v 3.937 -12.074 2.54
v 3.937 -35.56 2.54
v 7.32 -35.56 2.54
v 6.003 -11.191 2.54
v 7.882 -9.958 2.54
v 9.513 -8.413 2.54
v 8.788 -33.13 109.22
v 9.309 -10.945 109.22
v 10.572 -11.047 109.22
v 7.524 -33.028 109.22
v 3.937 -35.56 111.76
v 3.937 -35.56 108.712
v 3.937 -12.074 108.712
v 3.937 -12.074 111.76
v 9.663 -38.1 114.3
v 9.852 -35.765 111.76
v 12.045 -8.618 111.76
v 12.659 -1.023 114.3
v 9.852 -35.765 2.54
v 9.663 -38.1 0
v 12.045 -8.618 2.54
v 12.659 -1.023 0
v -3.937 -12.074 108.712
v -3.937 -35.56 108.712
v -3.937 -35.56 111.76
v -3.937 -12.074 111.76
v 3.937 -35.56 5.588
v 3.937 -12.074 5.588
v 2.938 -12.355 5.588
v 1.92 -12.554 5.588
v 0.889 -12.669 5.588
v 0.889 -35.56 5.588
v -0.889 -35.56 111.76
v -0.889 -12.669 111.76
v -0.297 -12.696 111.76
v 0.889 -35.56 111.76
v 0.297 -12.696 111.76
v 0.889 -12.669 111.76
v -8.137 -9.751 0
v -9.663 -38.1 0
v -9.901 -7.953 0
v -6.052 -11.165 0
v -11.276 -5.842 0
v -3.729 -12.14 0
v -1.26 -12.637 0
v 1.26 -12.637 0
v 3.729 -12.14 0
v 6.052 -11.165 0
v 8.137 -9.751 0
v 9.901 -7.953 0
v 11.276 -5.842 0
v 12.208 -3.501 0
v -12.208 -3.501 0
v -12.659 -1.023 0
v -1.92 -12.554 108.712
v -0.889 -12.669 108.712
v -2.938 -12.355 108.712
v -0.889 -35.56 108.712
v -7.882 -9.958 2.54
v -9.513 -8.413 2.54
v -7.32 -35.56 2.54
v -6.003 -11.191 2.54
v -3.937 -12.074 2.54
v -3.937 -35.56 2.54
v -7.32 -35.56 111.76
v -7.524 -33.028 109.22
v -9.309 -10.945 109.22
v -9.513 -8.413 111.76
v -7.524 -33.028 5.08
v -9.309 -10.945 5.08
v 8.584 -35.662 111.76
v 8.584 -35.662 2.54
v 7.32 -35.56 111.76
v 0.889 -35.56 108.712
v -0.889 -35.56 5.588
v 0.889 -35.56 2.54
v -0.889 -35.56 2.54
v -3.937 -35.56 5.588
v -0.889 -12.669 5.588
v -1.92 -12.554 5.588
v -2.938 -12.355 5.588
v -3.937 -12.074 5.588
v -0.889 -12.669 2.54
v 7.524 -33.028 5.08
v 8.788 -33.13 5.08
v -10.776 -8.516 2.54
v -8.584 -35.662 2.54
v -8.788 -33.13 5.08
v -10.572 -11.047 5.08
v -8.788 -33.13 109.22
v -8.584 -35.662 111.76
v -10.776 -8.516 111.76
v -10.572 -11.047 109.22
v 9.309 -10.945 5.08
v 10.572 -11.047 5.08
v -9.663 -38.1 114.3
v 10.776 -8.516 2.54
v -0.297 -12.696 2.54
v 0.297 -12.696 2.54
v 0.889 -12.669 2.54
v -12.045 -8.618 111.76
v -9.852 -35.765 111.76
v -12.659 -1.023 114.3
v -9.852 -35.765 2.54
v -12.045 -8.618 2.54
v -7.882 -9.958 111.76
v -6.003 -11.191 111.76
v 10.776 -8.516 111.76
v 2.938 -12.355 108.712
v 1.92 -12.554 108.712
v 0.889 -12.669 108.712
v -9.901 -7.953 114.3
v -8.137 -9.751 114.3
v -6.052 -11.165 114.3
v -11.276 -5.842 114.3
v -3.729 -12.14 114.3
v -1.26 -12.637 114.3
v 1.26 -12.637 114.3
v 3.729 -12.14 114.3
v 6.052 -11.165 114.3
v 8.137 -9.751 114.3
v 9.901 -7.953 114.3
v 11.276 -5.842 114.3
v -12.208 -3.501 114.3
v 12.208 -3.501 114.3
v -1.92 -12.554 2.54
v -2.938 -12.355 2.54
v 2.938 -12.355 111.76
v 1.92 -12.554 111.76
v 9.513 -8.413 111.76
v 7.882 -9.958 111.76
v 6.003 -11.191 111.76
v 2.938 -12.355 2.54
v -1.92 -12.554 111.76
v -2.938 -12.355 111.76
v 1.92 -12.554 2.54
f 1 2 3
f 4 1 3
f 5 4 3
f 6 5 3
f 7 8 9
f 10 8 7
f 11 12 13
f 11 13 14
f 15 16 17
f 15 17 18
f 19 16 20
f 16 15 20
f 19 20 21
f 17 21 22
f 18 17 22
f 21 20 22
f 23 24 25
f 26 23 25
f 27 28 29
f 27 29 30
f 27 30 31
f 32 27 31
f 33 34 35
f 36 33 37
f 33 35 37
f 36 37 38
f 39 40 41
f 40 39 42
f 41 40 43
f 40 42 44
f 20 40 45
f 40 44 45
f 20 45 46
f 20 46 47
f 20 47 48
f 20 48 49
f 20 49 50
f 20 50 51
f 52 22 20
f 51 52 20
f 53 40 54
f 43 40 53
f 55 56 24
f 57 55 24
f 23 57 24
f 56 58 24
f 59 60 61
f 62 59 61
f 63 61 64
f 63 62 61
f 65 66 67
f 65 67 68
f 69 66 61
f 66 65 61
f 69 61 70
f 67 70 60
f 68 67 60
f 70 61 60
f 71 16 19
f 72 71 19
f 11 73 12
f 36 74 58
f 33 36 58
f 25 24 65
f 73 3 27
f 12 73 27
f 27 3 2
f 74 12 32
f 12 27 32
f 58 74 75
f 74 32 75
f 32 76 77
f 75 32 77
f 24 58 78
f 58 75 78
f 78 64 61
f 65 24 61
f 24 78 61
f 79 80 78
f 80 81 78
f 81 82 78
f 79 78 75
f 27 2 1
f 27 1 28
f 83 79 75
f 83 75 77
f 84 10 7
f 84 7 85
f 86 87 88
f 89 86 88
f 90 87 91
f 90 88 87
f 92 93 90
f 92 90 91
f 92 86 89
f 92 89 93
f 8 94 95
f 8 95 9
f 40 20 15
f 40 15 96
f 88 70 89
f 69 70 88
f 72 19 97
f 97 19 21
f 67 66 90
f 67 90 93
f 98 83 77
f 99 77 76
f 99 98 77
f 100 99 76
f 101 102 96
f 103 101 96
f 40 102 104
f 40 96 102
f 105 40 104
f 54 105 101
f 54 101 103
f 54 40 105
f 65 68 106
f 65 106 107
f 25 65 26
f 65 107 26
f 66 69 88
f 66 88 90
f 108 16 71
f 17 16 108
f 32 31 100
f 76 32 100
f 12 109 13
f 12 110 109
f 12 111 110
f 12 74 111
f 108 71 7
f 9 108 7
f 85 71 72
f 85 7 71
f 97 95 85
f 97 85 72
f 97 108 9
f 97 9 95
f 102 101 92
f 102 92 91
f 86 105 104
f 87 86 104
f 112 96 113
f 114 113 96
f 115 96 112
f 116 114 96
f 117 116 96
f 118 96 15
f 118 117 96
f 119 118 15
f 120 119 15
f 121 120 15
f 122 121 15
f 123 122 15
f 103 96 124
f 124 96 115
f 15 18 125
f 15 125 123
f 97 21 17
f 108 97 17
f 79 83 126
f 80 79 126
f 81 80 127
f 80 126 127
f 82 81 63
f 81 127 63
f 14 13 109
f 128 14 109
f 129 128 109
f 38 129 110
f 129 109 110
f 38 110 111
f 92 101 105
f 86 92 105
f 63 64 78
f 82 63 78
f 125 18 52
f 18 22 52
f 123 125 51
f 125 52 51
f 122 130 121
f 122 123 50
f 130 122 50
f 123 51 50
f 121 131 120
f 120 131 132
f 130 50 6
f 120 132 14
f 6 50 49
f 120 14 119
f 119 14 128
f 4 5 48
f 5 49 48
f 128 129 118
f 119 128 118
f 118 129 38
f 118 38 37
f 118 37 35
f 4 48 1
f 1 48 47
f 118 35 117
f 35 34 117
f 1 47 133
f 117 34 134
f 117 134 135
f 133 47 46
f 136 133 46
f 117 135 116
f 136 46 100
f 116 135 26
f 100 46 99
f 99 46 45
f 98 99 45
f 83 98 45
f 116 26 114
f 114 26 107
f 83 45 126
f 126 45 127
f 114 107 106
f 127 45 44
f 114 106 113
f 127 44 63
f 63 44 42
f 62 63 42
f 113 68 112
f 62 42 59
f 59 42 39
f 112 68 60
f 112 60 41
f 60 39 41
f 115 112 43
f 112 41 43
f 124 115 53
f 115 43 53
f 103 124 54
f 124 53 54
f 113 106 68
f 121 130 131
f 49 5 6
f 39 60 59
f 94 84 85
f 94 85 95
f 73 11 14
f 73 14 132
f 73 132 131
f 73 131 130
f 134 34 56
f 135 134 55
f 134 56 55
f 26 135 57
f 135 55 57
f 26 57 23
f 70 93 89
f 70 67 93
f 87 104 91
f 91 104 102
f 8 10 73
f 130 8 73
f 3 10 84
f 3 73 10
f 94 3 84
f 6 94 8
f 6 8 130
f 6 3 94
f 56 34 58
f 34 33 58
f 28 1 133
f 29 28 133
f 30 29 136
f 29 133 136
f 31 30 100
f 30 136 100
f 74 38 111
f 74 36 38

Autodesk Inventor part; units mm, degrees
ref_plane "YZ Plane" through (0, 0, 0) normal (1, 0, 0) x (0, 1, 0)
ref_plane "XZ Plane" through (0, 0, 0) normal (0, 1, 0) x (-1, 0, 0)
sketch "Sketch1" plane through (0, 0, 0) normal (0, 0, 1) x (1, 0, 0)
  arc A0 (-12.6587, -1.0228) -> (12.6587, -1.0228) centre (0, 0) ccw
  line L0 (0, 0) -> (0, -38.1)
  line L1 (0, -38.1) -> (-9.663, -38.1)
  line L2 (-9.663, -38.1) -> (-12.6587, -1.0228)
  line L3 (0, -38.1) -> (9.663, -38.1)
  line L4 (9.663, -38.1) -> (12.6587, -1.0228)
  dimension "d0" = 25.4
  dimension "d1" = 38.1
  dimension "d2" = 9.663
  dimension "d3" = 9.663
extrude "Extrusion1" add sketch "Sketch1" along normal blind 114.3
shell "Shell1" thickness 2.54 removed faces 1 at (-12.5308, -2.0661, 76.2)
sketch "Sketch2" plane through (-9.5133, -8.4135, 111.76) normal (0.9968, 0.0805, 0) x (0, 0, -1)
  line L0 (109.22, 0) -> (109.22, -27.235) projected
  line L1 (0, 0) -> (109.22, 0) projected
  line L2 (0, 0) -> (0, -27.235) projected
  line L3 (109.22, -27.235) -> (0, -27.235) projected
  line L4 (106.68, -2.54) -> (106.68, -24.695)
  line L5 (106.68, -24.695) -> (2.54, -24.695)
  line L6 (2.54, -24.695) -> (2.54, -2.54)
  line L7 (2.54, -2.54) -> (106.68, -2.54)
  point P0 (111.76, 7.62)
  dimension "d9" = 2.54
sketch "Sketch3" plane through (-9.663, -38.1, 0) normal (-0.9968, -0.0805, 0) x (0, 0, 1)
  line L0 (2.54, 29.578) -> (2.54, 2.3431) projected
  line L1 (111.76, 29.578) -> (2.54, 29.578) projected
  line L2 (111.76, 29.578) -> (111.76, 2.3431) projected
  line L3 (2.54, 2.3431) -> (111.76, 2.3431) projected
  point P0 (0, 37.198)
extrude "Extrusion2" cut sketch "Sketch3" against normal blind 1.27
extrude "Extrusion3" cut sketch "Sketch2" against normal blind 1.27 contours L4 L5 L6 L7
mirror "Mirror1" about plane through (0, 0, 0) normal (1, 0, 0) of "Extrusion3", "Extrusion2"
sketch "Sketch4" plane through (-7.32, -35.56, 2.54) normal (0, 1, 0) x (1, 0, 0)
  line L0 (16.8333, -109.22) -> (-2.1933, -109.22) projected
  line L1 (7.32, -109.22) -> (6.431, -109.22)
  line L2 (6.431, -109.22) -> (6.431, -106.172)
  line L3 (6.431, -106.172) -> (3.383, -106.172)
  line L4 (3.383, -106.172) -> (3.383, -109.22)
  line L5 (-2.1933, -109.22) -> (16.8333, -109.22)
  line L6 (7.32, -109.22) -> (8.209, -109.22)
  line L7 (8.209, -109.22) -> (8.209, -106.172)
  line L8 (8.209, -106.172) -> (11.257, -106.172)
  line L9 (11.257, -106.172) -> (11.257, -109.22)
  point P0 (7.32, 2.54)
  dimension "d12" = 0.889
  dimension "d13" = 3.048
  dimension "d14" = 3.048
extrude "Extrusion4" add sketch "Sketch4" along normal blind 26.67
ref_plane "Work Plane1" through (0, 0, 57.15) normal (0, 0, -1) x (-1, 0, 0)
mirror "Mirror2" about plane through (0, 0, 57.15) normal (0, 0, -1) of "Extrusion4"
sketch "Sketch6" plane through (0, 0, 0) normal (0, 0, -1) x (-1, 0, 0)
  arc A0 (-12.6587, -1.0228) -> (12.6587, -1.0228) centre (0, 0) ccw projected
  line L0 (-12.6587, -1.0228) -> (12.6587, -1.0228)
extrude "Extrusion6" cut sketch "Sketch6" against normal blind 304.8
sketch "Sketch7" plane through (0, 0, 0) normal (0, 0, -1) x (-1, 0, 0)
  line L0 (-8.8842, -16.2006) -> (-9.5133, -8.4135)
  line L1 (-3.937, -12.0744) -> (-3.937, -16.2006)
  line L2 (-8.8842, -16.2006) -> (-3.937, -16.2006)
  line L3 (-3.937, -16.2006) -> (-3.937, -12.0744)
  arc A0 (-9.5133, -8.4135) -> (-3.937, -12.0744) centre (0, 0) ccw
properties part number "Tractive Light Mount"
